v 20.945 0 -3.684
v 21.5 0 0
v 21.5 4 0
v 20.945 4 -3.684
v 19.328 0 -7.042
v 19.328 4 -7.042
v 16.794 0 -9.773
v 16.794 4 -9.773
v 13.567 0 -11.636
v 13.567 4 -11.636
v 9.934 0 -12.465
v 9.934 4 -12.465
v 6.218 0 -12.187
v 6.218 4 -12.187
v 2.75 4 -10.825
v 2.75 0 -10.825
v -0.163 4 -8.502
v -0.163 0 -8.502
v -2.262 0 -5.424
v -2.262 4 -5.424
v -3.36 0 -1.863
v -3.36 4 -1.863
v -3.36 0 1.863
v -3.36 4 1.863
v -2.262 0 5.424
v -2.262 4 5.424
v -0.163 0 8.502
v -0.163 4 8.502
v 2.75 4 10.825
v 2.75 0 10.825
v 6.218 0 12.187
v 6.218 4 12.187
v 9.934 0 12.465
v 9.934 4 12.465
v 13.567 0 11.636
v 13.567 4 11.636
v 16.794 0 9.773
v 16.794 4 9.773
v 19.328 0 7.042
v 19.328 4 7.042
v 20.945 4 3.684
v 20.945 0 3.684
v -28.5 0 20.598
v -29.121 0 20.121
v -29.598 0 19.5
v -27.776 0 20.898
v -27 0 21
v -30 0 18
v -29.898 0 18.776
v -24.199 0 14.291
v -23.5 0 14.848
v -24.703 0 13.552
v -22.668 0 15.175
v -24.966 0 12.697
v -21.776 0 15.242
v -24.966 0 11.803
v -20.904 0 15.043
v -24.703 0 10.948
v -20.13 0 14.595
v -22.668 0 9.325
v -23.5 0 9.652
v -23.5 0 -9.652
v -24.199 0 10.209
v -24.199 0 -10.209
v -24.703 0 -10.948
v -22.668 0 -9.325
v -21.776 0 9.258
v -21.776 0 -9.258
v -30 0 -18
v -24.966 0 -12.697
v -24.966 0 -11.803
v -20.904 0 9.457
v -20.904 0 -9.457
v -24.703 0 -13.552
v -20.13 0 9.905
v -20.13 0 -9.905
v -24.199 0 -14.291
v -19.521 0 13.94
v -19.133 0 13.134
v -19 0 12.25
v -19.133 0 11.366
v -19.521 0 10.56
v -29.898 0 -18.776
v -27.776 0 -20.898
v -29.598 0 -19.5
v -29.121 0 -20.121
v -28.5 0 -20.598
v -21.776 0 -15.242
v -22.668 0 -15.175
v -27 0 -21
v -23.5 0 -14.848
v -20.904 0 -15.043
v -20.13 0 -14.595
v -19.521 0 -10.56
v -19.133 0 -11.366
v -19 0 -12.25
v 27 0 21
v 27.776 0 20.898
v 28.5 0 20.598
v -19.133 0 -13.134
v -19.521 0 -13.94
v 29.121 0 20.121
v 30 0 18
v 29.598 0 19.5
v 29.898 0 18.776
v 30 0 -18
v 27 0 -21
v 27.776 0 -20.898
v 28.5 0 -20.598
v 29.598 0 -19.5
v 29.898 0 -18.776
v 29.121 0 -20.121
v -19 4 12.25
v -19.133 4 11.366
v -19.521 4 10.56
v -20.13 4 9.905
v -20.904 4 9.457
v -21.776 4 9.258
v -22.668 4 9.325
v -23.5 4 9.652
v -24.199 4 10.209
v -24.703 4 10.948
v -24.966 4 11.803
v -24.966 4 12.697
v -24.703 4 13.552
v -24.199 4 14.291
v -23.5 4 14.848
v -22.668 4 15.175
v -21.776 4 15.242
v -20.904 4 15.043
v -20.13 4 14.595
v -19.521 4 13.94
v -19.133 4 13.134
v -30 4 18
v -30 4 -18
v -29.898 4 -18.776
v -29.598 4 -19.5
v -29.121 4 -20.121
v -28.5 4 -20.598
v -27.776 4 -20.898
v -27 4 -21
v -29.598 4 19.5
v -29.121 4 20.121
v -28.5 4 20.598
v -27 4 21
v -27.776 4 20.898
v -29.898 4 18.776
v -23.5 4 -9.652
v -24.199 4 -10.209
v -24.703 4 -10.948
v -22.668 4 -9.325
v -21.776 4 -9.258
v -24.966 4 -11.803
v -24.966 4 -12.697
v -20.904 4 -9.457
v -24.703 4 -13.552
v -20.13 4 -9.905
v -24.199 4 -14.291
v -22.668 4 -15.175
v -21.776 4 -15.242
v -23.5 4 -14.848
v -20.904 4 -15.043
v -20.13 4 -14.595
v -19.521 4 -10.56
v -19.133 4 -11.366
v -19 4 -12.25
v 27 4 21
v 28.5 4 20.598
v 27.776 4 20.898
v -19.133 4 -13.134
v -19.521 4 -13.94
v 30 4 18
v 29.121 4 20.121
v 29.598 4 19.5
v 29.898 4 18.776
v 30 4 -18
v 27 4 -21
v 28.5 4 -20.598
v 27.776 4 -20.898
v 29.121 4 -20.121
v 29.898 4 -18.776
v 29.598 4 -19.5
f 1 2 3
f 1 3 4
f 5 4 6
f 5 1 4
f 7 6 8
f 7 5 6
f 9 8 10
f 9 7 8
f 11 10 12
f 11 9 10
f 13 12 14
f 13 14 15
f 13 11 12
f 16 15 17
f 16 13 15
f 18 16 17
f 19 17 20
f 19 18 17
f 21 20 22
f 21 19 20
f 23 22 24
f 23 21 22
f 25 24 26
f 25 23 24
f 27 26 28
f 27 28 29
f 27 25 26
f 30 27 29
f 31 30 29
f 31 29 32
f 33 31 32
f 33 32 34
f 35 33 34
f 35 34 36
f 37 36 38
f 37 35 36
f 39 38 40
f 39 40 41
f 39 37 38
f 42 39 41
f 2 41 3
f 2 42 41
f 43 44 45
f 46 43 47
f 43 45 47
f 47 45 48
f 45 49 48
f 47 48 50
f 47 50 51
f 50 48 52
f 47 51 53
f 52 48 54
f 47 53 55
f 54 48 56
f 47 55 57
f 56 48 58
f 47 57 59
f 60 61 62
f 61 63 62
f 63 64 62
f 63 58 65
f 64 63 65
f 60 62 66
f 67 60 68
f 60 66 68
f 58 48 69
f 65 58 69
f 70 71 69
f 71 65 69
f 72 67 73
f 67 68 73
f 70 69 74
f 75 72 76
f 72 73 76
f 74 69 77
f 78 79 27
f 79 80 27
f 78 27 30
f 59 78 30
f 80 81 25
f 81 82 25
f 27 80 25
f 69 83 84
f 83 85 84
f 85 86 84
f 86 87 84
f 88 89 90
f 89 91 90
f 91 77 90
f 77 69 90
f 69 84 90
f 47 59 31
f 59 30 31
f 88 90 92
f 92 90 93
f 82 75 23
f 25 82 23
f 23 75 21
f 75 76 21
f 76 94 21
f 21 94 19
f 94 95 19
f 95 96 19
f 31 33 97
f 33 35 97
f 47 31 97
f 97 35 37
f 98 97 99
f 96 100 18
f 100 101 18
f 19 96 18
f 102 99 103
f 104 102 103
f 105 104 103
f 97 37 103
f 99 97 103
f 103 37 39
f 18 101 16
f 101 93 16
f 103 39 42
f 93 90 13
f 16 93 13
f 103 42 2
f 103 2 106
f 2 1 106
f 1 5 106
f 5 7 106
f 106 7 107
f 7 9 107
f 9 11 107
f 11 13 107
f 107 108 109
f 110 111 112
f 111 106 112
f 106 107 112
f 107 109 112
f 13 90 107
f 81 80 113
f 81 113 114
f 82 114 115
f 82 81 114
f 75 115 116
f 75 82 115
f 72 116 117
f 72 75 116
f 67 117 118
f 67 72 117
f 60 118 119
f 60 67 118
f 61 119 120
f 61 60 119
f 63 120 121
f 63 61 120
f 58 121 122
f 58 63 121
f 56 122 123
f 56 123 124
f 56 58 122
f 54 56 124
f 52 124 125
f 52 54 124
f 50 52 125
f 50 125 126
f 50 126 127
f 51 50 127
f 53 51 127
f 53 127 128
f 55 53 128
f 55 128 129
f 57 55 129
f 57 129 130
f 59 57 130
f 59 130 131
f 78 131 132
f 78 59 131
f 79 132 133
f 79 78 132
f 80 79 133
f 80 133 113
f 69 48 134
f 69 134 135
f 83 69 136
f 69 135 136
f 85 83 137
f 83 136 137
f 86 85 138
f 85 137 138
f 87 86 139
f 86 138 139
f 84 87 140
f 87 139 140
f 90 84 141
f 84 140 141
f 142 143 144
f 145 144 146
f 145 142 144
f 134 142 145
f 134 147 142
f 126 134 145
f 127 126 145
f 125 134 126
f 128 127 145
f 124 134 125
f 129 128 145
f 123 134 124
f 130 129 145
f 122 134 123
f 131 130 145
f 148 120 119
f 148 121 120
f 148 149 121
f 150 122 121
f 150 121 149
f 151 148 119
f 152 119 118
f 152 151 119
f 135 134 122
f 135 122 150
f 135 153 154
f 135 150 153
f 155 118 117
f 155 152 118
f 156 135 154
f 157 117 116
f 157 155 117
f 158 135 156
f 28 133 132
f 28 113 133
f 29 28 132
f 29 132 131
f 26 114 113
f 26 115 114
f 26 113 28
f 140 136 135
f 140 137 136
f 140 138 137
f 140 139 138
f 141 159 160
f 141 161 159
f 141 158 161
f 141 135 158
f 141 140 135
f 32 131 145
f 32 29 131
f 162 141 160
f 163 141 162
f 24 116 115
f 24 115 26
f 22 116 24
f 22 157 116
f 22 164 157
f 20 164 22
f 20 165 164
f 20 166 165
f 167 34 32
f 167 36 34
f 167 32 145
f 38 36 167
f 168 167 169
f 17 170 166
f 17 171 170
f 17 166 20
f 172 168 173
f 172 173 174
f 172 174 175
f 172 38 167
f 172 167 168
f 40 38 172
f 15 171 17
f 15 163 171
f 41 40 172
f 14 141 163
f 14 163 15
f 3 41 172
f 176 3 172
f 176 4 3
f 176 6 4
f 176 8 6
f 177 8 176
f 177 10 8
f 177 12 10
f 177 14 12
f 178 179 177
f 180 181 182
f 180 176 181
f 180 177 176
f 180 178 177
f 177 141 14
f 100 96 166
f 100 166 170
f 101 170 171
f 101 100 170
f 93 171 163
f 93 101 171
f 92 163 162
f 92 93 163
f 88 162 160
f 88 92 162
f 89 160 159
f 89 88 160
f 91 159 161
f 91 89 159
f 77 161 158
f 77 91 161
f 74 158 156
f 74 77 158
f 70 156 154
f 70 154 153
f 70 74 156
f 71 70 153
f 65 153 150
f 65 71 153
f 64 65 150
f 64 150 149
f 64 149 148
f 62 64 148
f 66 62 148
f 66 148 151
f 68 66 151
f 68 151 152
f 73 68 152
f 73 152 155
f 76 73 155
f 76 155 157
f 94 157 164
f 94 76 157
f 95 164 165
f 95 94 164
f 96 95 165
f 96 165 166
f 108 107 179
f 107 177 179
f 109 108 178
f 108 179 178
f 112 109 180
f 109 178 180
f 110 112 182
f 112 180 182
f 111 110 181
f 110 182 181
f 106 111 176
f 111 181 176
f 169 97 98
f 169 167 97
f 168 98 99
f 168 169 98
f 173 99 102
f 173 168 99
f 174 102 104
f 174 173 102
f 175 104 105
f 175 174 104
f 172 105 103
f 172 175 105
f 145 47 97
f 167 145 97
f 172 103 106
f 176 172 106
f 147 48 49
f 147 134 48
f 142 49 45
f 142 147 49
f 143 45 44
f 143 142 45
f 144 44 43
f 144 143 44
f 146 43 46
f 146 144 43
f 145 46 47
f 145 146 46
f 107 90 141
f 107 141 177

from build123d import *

# Parameters (mm, degrees)
SKETCH1_W           = 60
SKETCH1_H           = 42
SKETCH1_R           = 12.5
SKETCH1_R_2         = 3
BOSS_EXTRUDE1_DEPTH = 4
FILLET2_R           = 3


with BuildPart() as part:
    # Sketch1 → Boss-Extrude1 (new body)
    with BuildSketch(Plane(origin=(0, 0, 0), x_dir=(1, 0, 0), z_dir=(0, 1, 0))):
        Rectangle(SKETCH1_W, SKETCH1_H)
        with Locations((9, 0)):
            Circle(SKETCH1_R, mode=Mode.SUBTRACT)
        with Locations((-22, 12.25)):
            Circle(SKETCH1_R_2, mode=Mode.SUBTRACT)
        with Locations((-22, -12.25)):
            Circle(SKETCH1_R_2, mode=Mode.SUBTRACT)
    extrude(amount=BOSS_EXTRUDE1_DEPTH)

    # Fillet2
    fillet2_edges = [part.edges().sort_by_distance(p)[0] for p in [
        (30, 2, 21),
        (-30, 2, 21),
        (-30, 2, -21),
        (30, 2, -21),
    ]]
    fillet(fillet2_edges, radius=FILLET2_R)


solid = part.part
